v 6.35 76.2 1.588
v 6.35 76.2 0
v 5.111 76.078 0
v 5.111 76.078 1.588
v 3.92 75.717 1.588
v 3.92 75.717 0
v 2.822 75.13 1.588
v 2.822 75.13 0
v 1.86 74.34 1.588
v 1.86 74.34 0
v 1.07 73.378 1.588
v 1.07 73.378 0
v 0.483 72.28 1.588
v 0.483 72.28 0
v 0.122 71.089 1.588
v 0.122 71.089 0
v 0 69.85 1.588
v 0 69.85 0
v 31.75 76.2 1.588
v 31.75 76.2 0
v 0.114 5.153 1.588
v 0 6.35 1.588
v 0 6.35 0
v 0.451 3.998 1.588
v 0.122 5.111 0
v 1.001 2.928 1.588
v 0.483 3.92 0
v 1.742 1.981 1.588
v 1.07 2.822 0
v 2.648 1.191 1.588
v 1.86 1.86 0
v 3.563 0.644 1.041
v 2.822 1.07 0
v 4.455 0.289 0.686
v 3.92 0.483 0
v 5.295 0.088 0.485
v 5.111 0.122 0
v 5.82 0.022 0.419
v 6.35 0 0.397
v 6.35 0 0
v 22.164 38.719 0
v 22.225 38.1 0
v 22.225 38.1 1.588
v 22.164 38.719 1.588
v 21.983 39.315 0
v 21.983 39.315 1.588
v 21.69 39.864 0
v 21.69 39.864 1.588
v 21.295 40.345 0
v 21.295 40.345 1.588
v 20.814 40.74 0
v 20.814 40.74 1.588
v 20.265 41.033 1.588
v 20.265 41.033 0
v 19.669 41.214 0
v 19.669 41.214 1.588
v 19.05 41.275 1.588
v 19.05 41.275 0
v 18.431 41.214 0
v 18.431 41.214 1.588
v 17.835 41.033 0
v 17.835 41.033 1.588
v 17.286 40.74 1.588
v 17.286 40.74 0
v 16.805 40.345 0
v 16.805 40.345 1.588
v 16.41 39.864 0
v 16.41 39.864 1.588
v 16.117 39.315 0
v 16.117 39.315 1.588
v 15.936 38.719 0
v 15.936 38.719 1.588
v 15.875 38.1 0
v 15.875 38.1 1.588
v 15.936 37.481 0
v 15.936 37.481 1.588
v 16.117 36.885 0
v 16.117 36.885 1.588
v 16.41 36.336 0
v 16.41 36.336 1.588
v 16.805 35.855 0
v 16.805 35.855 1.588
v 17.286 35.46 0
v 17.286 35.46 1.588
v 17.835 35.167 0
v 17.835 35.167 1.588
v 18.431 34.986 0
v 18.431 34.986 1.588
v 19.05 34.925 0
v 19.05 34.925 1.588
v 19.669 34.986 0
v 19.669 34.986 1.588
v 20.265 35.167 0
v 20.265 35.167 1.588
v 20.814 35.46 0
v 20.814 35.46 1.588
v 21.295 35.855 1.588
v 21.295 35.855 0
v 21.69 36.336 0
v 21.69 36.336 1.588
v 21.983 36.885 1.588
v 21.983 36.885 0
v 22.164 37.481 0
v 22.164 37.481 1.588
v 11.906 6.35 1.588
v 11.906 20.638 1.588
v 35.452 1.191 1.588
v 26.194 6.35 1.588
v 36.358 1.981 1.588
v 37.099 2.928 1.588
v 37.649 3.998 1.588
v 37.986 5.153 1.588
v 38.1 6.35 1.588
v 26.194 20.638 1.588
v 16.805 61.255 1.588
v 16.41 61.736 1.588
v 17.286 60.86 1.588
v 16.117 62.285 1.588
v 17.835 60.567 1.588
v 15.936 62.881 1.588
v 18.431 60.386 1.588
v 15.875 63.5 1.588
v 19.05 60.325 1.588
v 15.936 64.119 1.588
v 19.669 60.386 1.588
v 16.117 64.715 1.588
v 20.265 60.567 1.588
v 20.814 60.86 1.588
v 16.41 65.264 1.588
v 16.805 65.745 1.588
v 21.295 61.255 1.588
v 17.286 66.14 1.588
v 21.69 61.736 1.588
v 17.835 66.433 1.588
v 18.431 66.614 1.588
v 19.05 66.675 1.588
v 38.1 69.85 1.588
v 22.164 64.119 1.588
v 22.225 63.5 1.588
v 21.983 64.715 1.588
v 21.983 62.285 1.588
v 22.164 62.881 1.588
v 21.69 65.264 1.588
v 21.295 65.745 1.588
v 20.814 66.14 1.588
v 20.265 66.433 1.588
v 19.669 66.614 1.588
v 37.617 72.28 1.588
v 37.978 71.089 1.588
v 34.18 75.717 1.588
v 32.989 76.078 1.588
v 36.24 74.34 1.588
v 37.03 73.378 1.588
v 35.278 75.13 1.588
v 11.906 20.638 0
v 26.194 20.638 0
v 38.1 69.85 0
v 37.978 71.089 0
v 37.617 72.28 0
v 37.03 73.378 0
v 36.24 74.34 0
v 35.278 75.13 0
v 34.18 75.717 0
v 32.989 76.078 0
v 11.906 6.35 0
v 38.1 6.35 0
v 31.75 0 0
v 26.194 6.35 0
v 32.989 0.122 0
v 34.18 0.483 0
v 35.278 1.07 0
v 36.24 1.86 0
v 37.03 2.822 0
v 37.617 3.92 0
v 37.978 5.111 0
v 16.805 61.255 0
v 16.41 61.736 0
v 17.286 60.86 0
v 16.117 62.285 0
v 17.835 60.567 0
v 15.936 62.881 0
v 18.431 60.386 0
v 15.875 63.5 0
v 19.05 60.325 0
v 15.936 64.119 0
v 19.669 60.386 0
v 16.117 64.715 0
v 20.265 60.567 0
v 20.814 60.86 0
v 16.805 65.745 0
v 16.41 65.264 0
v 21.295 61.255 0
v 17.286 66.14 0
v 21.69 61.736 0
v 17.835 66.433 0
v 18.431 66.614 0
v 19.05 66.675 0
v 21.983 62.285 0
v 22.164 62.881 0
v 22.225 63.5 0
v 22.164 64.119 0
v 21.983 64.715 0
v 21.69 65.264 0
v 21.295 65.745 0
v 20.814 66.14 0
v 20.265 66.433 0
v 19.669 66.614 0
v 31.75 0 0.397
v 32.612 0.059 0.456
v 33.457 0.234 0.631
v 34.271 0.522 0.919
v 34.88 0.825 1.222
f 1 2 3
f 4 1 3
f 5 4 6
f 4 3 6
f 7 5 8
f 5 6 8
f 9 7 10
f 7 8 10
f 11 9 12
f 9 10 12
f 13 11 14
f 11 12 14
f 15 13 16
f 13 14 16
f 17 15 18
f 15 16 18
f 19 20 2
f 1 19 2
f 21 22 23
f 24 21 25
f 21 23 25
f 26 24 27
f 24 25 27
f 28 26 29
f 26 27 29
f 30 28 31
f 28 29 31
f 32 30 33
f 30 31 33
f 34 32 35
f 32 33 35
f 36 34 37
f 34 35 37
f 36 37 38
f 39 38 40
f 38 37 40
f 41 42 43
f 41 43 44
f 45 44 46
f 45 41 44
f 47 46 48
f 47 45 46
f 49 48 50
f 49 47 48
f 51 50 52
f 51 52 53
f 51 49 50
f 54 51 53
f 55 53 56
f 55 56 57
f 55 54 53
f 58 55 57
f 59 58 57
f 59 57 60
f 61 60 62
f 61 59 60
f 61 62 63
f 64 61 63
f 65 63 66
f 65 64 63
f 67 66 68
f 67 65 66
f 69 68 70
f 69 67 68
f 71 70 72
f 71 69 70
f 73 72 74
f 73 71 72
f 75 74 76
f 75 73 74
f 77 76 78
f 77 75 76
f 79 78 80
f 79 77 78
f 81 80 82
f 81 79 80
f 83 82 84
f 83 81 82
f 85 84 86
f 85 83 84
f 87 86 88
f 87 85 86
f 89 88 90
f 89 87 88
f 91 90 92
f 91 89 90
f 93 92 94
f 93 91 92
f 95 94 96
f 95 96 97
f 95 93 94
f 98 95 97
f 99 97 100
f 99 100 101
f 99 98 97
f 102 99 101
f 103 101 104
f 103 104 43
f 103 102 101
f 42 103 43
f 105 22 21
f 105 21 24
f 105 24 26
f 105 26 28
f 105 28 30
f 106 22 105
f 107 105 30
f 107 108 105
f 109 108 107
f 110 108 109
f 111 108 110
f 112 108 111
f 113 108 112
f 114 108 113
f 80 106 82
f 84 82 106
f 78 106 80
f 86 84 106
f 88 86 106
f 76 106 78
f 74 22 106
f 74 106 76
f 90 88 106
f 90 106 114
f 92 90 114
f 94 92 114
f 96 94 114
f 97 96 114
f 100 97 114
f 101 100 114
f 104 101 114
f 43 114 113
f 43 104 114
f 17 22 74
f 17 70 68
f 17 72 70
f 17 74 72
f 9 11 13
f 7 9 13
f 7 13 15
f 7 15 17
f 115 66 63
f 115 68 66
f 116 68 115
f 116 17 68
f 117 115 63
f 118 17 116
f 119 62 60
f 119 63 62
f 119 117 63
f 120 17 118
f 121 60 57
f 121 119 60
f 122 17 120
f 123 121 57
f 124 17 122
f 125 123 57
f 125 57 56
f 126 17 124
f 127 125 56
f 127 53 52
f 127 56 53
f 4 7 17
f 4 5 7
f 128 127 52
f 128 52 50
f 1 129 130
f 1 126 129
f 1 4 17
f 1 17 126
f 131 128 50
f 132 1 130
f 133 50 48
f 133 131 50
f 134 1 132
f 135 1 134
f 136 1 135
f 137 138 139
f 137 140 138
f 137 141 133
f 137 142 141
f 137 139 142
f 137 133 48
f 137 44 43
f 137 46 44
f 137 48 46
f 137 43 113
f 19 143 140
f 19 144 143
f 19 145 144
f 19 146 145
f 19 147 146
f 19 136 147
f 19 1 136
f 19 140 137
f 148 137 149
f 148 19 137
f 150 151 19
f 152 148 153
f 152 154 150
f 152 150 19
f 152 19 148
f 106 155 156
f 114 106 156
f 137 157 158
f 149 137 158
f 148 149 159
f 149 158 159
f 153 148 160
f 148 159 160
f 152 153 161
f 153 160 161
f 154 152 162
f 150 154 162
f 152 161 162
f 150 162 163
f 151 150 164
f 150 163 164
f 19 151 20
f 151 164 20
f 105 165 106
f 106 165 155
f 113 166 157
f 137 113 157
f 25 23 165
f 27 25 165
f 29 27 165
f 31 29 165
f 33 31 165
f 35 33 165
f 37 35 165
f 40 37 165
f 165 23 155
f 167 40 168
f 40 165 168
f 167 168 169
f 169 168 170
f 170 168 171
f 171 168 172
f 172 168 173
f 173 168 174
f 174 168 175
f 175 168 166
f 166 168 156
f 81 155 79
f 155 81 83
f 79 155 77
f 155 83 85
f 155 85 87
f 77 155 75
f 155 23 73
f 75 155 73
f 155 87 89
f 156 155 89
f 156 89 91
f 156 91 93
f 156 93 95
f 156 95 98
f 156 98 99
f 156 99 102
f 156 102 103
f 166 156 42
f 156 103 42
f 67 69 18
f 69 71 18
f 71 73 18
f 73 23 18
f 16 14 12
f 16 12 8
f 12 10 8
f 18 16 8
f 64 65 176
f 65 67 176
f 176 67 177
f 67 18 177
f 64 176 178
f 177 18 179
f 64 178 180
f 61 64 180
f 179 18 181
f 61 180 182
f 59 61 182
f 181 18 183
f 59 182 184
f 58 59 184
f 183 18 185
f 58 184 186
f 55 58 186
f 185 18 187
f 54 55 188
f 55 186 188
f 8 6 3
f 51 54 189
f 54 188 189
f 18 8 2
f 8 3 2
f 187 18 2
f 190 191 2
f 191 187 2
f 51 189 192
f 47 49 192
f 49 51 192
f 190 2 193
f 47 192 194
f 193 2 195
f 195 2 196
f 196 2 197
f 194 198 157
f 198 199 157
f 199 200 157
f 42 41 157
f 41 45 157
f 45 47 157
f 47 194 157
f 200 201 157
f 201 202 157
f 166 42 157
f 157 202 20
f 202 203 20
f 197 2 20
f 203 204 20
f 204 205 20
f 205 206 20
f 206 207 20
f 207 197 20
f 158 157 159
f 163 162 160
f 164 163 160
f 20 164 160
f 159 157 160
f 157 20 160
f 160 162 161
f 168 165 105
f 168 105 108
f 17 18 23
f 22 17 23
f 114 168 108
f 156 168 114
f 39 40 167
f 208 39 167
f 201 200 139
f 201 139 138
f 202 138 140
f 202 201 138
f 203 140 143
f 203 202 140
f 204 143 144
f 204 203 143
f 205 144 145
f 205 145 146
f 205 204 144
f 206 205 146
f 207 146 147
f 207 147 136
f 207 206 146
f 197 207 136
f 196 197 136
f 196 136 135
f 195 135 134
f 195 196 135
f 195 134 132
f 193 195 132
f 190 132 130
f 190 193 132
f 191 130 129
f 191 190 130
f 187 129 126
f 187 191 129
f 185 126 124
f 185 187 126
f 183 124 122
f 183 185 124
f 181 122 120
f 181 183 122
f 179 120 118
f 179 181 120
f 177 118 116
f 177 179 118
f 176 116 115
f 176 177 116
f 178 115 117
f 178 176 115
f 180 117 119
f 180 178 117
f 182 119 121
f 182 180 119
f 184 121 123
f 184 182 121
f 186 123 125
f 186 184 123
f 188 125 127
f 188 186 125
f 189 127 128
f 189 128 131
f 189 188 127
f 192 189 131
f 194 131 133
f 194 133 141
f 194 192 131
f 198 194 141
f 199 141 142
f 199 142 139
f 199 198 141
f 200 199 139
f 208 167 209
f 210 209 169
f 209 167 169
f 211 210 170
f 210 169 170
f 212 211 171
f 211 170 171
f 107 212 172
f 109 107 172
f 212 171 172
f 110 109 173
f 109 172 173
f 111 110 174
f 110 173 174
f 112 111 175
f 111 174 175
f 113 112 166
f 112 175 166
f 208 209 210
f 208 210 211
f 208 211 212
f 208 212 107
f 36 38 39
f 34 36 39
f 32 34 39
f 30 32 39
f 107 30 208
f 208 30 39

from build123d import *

# Parameters (mm, degrees)
SKETCH1_R           = 3.175
SKETCH1_W           = 14.2875
SKETCH1_H           = 14.2875
BOSS_EXTRUDE1_DEPTH = 1.5875
CUT_EXTRUDE1_DEPTH  = 76.2


with BuildPart() as part:
    # Sketch1 → Boss-Extrude1 (new body)
    with BuildSketch(Plane.XY):
        with BuildLine():
            Line((6.35, 0), (31.75, 0))
            ThreePointArc((31.75, 0), (36.240128061, 1.859871939), (38.1, 6.35))
            Line((38.1, 6.35), (38.1, 69.85))
            ThreePointArc((38.1, 69.85), (36.240128061, 74.340128061), (31.75, 76.2))
            Line((31.75, 76.2), (6.35, 76.2))
            ThreePointArc((6.35, 76.2), (1.859871939, 74.340128061), (0, 69.85))
            Line((0, 69.85), (0, 6.35))
            ThreePointArc((0, 6.35), (1.859871939, 1.859871939), (6.35, 0))
        make_face()
        with Locations((19.05, 38.1)):
            Circle(SKETCH1_R, mode=Mode.SUBTRACT)
        with Locations((19.05, 63.5)):
            Circle(SKETCH1_R, mode=Mode.SUBTRACT)
        with Locations((19.05, 13.49375)):
            Rectangle(SKETCH1_W, SKETCH1_H, mode=Mode.SUBTRACT)
    extrude(amount=BOSS_EXTRUDE1_DEPTH)

    # Sketch3 → Cut-Extrude1 (cut)
    with BuildSketch(Plane.ZY):
        Polygon((0.396875, 0), (1.5875, 1.190625), (1.5875, 0), align=None)
    extrude(amount=-CUT_EXTRUDE1_DEPTH, mode=Mode.SUBTRACT)


solid = part.part
